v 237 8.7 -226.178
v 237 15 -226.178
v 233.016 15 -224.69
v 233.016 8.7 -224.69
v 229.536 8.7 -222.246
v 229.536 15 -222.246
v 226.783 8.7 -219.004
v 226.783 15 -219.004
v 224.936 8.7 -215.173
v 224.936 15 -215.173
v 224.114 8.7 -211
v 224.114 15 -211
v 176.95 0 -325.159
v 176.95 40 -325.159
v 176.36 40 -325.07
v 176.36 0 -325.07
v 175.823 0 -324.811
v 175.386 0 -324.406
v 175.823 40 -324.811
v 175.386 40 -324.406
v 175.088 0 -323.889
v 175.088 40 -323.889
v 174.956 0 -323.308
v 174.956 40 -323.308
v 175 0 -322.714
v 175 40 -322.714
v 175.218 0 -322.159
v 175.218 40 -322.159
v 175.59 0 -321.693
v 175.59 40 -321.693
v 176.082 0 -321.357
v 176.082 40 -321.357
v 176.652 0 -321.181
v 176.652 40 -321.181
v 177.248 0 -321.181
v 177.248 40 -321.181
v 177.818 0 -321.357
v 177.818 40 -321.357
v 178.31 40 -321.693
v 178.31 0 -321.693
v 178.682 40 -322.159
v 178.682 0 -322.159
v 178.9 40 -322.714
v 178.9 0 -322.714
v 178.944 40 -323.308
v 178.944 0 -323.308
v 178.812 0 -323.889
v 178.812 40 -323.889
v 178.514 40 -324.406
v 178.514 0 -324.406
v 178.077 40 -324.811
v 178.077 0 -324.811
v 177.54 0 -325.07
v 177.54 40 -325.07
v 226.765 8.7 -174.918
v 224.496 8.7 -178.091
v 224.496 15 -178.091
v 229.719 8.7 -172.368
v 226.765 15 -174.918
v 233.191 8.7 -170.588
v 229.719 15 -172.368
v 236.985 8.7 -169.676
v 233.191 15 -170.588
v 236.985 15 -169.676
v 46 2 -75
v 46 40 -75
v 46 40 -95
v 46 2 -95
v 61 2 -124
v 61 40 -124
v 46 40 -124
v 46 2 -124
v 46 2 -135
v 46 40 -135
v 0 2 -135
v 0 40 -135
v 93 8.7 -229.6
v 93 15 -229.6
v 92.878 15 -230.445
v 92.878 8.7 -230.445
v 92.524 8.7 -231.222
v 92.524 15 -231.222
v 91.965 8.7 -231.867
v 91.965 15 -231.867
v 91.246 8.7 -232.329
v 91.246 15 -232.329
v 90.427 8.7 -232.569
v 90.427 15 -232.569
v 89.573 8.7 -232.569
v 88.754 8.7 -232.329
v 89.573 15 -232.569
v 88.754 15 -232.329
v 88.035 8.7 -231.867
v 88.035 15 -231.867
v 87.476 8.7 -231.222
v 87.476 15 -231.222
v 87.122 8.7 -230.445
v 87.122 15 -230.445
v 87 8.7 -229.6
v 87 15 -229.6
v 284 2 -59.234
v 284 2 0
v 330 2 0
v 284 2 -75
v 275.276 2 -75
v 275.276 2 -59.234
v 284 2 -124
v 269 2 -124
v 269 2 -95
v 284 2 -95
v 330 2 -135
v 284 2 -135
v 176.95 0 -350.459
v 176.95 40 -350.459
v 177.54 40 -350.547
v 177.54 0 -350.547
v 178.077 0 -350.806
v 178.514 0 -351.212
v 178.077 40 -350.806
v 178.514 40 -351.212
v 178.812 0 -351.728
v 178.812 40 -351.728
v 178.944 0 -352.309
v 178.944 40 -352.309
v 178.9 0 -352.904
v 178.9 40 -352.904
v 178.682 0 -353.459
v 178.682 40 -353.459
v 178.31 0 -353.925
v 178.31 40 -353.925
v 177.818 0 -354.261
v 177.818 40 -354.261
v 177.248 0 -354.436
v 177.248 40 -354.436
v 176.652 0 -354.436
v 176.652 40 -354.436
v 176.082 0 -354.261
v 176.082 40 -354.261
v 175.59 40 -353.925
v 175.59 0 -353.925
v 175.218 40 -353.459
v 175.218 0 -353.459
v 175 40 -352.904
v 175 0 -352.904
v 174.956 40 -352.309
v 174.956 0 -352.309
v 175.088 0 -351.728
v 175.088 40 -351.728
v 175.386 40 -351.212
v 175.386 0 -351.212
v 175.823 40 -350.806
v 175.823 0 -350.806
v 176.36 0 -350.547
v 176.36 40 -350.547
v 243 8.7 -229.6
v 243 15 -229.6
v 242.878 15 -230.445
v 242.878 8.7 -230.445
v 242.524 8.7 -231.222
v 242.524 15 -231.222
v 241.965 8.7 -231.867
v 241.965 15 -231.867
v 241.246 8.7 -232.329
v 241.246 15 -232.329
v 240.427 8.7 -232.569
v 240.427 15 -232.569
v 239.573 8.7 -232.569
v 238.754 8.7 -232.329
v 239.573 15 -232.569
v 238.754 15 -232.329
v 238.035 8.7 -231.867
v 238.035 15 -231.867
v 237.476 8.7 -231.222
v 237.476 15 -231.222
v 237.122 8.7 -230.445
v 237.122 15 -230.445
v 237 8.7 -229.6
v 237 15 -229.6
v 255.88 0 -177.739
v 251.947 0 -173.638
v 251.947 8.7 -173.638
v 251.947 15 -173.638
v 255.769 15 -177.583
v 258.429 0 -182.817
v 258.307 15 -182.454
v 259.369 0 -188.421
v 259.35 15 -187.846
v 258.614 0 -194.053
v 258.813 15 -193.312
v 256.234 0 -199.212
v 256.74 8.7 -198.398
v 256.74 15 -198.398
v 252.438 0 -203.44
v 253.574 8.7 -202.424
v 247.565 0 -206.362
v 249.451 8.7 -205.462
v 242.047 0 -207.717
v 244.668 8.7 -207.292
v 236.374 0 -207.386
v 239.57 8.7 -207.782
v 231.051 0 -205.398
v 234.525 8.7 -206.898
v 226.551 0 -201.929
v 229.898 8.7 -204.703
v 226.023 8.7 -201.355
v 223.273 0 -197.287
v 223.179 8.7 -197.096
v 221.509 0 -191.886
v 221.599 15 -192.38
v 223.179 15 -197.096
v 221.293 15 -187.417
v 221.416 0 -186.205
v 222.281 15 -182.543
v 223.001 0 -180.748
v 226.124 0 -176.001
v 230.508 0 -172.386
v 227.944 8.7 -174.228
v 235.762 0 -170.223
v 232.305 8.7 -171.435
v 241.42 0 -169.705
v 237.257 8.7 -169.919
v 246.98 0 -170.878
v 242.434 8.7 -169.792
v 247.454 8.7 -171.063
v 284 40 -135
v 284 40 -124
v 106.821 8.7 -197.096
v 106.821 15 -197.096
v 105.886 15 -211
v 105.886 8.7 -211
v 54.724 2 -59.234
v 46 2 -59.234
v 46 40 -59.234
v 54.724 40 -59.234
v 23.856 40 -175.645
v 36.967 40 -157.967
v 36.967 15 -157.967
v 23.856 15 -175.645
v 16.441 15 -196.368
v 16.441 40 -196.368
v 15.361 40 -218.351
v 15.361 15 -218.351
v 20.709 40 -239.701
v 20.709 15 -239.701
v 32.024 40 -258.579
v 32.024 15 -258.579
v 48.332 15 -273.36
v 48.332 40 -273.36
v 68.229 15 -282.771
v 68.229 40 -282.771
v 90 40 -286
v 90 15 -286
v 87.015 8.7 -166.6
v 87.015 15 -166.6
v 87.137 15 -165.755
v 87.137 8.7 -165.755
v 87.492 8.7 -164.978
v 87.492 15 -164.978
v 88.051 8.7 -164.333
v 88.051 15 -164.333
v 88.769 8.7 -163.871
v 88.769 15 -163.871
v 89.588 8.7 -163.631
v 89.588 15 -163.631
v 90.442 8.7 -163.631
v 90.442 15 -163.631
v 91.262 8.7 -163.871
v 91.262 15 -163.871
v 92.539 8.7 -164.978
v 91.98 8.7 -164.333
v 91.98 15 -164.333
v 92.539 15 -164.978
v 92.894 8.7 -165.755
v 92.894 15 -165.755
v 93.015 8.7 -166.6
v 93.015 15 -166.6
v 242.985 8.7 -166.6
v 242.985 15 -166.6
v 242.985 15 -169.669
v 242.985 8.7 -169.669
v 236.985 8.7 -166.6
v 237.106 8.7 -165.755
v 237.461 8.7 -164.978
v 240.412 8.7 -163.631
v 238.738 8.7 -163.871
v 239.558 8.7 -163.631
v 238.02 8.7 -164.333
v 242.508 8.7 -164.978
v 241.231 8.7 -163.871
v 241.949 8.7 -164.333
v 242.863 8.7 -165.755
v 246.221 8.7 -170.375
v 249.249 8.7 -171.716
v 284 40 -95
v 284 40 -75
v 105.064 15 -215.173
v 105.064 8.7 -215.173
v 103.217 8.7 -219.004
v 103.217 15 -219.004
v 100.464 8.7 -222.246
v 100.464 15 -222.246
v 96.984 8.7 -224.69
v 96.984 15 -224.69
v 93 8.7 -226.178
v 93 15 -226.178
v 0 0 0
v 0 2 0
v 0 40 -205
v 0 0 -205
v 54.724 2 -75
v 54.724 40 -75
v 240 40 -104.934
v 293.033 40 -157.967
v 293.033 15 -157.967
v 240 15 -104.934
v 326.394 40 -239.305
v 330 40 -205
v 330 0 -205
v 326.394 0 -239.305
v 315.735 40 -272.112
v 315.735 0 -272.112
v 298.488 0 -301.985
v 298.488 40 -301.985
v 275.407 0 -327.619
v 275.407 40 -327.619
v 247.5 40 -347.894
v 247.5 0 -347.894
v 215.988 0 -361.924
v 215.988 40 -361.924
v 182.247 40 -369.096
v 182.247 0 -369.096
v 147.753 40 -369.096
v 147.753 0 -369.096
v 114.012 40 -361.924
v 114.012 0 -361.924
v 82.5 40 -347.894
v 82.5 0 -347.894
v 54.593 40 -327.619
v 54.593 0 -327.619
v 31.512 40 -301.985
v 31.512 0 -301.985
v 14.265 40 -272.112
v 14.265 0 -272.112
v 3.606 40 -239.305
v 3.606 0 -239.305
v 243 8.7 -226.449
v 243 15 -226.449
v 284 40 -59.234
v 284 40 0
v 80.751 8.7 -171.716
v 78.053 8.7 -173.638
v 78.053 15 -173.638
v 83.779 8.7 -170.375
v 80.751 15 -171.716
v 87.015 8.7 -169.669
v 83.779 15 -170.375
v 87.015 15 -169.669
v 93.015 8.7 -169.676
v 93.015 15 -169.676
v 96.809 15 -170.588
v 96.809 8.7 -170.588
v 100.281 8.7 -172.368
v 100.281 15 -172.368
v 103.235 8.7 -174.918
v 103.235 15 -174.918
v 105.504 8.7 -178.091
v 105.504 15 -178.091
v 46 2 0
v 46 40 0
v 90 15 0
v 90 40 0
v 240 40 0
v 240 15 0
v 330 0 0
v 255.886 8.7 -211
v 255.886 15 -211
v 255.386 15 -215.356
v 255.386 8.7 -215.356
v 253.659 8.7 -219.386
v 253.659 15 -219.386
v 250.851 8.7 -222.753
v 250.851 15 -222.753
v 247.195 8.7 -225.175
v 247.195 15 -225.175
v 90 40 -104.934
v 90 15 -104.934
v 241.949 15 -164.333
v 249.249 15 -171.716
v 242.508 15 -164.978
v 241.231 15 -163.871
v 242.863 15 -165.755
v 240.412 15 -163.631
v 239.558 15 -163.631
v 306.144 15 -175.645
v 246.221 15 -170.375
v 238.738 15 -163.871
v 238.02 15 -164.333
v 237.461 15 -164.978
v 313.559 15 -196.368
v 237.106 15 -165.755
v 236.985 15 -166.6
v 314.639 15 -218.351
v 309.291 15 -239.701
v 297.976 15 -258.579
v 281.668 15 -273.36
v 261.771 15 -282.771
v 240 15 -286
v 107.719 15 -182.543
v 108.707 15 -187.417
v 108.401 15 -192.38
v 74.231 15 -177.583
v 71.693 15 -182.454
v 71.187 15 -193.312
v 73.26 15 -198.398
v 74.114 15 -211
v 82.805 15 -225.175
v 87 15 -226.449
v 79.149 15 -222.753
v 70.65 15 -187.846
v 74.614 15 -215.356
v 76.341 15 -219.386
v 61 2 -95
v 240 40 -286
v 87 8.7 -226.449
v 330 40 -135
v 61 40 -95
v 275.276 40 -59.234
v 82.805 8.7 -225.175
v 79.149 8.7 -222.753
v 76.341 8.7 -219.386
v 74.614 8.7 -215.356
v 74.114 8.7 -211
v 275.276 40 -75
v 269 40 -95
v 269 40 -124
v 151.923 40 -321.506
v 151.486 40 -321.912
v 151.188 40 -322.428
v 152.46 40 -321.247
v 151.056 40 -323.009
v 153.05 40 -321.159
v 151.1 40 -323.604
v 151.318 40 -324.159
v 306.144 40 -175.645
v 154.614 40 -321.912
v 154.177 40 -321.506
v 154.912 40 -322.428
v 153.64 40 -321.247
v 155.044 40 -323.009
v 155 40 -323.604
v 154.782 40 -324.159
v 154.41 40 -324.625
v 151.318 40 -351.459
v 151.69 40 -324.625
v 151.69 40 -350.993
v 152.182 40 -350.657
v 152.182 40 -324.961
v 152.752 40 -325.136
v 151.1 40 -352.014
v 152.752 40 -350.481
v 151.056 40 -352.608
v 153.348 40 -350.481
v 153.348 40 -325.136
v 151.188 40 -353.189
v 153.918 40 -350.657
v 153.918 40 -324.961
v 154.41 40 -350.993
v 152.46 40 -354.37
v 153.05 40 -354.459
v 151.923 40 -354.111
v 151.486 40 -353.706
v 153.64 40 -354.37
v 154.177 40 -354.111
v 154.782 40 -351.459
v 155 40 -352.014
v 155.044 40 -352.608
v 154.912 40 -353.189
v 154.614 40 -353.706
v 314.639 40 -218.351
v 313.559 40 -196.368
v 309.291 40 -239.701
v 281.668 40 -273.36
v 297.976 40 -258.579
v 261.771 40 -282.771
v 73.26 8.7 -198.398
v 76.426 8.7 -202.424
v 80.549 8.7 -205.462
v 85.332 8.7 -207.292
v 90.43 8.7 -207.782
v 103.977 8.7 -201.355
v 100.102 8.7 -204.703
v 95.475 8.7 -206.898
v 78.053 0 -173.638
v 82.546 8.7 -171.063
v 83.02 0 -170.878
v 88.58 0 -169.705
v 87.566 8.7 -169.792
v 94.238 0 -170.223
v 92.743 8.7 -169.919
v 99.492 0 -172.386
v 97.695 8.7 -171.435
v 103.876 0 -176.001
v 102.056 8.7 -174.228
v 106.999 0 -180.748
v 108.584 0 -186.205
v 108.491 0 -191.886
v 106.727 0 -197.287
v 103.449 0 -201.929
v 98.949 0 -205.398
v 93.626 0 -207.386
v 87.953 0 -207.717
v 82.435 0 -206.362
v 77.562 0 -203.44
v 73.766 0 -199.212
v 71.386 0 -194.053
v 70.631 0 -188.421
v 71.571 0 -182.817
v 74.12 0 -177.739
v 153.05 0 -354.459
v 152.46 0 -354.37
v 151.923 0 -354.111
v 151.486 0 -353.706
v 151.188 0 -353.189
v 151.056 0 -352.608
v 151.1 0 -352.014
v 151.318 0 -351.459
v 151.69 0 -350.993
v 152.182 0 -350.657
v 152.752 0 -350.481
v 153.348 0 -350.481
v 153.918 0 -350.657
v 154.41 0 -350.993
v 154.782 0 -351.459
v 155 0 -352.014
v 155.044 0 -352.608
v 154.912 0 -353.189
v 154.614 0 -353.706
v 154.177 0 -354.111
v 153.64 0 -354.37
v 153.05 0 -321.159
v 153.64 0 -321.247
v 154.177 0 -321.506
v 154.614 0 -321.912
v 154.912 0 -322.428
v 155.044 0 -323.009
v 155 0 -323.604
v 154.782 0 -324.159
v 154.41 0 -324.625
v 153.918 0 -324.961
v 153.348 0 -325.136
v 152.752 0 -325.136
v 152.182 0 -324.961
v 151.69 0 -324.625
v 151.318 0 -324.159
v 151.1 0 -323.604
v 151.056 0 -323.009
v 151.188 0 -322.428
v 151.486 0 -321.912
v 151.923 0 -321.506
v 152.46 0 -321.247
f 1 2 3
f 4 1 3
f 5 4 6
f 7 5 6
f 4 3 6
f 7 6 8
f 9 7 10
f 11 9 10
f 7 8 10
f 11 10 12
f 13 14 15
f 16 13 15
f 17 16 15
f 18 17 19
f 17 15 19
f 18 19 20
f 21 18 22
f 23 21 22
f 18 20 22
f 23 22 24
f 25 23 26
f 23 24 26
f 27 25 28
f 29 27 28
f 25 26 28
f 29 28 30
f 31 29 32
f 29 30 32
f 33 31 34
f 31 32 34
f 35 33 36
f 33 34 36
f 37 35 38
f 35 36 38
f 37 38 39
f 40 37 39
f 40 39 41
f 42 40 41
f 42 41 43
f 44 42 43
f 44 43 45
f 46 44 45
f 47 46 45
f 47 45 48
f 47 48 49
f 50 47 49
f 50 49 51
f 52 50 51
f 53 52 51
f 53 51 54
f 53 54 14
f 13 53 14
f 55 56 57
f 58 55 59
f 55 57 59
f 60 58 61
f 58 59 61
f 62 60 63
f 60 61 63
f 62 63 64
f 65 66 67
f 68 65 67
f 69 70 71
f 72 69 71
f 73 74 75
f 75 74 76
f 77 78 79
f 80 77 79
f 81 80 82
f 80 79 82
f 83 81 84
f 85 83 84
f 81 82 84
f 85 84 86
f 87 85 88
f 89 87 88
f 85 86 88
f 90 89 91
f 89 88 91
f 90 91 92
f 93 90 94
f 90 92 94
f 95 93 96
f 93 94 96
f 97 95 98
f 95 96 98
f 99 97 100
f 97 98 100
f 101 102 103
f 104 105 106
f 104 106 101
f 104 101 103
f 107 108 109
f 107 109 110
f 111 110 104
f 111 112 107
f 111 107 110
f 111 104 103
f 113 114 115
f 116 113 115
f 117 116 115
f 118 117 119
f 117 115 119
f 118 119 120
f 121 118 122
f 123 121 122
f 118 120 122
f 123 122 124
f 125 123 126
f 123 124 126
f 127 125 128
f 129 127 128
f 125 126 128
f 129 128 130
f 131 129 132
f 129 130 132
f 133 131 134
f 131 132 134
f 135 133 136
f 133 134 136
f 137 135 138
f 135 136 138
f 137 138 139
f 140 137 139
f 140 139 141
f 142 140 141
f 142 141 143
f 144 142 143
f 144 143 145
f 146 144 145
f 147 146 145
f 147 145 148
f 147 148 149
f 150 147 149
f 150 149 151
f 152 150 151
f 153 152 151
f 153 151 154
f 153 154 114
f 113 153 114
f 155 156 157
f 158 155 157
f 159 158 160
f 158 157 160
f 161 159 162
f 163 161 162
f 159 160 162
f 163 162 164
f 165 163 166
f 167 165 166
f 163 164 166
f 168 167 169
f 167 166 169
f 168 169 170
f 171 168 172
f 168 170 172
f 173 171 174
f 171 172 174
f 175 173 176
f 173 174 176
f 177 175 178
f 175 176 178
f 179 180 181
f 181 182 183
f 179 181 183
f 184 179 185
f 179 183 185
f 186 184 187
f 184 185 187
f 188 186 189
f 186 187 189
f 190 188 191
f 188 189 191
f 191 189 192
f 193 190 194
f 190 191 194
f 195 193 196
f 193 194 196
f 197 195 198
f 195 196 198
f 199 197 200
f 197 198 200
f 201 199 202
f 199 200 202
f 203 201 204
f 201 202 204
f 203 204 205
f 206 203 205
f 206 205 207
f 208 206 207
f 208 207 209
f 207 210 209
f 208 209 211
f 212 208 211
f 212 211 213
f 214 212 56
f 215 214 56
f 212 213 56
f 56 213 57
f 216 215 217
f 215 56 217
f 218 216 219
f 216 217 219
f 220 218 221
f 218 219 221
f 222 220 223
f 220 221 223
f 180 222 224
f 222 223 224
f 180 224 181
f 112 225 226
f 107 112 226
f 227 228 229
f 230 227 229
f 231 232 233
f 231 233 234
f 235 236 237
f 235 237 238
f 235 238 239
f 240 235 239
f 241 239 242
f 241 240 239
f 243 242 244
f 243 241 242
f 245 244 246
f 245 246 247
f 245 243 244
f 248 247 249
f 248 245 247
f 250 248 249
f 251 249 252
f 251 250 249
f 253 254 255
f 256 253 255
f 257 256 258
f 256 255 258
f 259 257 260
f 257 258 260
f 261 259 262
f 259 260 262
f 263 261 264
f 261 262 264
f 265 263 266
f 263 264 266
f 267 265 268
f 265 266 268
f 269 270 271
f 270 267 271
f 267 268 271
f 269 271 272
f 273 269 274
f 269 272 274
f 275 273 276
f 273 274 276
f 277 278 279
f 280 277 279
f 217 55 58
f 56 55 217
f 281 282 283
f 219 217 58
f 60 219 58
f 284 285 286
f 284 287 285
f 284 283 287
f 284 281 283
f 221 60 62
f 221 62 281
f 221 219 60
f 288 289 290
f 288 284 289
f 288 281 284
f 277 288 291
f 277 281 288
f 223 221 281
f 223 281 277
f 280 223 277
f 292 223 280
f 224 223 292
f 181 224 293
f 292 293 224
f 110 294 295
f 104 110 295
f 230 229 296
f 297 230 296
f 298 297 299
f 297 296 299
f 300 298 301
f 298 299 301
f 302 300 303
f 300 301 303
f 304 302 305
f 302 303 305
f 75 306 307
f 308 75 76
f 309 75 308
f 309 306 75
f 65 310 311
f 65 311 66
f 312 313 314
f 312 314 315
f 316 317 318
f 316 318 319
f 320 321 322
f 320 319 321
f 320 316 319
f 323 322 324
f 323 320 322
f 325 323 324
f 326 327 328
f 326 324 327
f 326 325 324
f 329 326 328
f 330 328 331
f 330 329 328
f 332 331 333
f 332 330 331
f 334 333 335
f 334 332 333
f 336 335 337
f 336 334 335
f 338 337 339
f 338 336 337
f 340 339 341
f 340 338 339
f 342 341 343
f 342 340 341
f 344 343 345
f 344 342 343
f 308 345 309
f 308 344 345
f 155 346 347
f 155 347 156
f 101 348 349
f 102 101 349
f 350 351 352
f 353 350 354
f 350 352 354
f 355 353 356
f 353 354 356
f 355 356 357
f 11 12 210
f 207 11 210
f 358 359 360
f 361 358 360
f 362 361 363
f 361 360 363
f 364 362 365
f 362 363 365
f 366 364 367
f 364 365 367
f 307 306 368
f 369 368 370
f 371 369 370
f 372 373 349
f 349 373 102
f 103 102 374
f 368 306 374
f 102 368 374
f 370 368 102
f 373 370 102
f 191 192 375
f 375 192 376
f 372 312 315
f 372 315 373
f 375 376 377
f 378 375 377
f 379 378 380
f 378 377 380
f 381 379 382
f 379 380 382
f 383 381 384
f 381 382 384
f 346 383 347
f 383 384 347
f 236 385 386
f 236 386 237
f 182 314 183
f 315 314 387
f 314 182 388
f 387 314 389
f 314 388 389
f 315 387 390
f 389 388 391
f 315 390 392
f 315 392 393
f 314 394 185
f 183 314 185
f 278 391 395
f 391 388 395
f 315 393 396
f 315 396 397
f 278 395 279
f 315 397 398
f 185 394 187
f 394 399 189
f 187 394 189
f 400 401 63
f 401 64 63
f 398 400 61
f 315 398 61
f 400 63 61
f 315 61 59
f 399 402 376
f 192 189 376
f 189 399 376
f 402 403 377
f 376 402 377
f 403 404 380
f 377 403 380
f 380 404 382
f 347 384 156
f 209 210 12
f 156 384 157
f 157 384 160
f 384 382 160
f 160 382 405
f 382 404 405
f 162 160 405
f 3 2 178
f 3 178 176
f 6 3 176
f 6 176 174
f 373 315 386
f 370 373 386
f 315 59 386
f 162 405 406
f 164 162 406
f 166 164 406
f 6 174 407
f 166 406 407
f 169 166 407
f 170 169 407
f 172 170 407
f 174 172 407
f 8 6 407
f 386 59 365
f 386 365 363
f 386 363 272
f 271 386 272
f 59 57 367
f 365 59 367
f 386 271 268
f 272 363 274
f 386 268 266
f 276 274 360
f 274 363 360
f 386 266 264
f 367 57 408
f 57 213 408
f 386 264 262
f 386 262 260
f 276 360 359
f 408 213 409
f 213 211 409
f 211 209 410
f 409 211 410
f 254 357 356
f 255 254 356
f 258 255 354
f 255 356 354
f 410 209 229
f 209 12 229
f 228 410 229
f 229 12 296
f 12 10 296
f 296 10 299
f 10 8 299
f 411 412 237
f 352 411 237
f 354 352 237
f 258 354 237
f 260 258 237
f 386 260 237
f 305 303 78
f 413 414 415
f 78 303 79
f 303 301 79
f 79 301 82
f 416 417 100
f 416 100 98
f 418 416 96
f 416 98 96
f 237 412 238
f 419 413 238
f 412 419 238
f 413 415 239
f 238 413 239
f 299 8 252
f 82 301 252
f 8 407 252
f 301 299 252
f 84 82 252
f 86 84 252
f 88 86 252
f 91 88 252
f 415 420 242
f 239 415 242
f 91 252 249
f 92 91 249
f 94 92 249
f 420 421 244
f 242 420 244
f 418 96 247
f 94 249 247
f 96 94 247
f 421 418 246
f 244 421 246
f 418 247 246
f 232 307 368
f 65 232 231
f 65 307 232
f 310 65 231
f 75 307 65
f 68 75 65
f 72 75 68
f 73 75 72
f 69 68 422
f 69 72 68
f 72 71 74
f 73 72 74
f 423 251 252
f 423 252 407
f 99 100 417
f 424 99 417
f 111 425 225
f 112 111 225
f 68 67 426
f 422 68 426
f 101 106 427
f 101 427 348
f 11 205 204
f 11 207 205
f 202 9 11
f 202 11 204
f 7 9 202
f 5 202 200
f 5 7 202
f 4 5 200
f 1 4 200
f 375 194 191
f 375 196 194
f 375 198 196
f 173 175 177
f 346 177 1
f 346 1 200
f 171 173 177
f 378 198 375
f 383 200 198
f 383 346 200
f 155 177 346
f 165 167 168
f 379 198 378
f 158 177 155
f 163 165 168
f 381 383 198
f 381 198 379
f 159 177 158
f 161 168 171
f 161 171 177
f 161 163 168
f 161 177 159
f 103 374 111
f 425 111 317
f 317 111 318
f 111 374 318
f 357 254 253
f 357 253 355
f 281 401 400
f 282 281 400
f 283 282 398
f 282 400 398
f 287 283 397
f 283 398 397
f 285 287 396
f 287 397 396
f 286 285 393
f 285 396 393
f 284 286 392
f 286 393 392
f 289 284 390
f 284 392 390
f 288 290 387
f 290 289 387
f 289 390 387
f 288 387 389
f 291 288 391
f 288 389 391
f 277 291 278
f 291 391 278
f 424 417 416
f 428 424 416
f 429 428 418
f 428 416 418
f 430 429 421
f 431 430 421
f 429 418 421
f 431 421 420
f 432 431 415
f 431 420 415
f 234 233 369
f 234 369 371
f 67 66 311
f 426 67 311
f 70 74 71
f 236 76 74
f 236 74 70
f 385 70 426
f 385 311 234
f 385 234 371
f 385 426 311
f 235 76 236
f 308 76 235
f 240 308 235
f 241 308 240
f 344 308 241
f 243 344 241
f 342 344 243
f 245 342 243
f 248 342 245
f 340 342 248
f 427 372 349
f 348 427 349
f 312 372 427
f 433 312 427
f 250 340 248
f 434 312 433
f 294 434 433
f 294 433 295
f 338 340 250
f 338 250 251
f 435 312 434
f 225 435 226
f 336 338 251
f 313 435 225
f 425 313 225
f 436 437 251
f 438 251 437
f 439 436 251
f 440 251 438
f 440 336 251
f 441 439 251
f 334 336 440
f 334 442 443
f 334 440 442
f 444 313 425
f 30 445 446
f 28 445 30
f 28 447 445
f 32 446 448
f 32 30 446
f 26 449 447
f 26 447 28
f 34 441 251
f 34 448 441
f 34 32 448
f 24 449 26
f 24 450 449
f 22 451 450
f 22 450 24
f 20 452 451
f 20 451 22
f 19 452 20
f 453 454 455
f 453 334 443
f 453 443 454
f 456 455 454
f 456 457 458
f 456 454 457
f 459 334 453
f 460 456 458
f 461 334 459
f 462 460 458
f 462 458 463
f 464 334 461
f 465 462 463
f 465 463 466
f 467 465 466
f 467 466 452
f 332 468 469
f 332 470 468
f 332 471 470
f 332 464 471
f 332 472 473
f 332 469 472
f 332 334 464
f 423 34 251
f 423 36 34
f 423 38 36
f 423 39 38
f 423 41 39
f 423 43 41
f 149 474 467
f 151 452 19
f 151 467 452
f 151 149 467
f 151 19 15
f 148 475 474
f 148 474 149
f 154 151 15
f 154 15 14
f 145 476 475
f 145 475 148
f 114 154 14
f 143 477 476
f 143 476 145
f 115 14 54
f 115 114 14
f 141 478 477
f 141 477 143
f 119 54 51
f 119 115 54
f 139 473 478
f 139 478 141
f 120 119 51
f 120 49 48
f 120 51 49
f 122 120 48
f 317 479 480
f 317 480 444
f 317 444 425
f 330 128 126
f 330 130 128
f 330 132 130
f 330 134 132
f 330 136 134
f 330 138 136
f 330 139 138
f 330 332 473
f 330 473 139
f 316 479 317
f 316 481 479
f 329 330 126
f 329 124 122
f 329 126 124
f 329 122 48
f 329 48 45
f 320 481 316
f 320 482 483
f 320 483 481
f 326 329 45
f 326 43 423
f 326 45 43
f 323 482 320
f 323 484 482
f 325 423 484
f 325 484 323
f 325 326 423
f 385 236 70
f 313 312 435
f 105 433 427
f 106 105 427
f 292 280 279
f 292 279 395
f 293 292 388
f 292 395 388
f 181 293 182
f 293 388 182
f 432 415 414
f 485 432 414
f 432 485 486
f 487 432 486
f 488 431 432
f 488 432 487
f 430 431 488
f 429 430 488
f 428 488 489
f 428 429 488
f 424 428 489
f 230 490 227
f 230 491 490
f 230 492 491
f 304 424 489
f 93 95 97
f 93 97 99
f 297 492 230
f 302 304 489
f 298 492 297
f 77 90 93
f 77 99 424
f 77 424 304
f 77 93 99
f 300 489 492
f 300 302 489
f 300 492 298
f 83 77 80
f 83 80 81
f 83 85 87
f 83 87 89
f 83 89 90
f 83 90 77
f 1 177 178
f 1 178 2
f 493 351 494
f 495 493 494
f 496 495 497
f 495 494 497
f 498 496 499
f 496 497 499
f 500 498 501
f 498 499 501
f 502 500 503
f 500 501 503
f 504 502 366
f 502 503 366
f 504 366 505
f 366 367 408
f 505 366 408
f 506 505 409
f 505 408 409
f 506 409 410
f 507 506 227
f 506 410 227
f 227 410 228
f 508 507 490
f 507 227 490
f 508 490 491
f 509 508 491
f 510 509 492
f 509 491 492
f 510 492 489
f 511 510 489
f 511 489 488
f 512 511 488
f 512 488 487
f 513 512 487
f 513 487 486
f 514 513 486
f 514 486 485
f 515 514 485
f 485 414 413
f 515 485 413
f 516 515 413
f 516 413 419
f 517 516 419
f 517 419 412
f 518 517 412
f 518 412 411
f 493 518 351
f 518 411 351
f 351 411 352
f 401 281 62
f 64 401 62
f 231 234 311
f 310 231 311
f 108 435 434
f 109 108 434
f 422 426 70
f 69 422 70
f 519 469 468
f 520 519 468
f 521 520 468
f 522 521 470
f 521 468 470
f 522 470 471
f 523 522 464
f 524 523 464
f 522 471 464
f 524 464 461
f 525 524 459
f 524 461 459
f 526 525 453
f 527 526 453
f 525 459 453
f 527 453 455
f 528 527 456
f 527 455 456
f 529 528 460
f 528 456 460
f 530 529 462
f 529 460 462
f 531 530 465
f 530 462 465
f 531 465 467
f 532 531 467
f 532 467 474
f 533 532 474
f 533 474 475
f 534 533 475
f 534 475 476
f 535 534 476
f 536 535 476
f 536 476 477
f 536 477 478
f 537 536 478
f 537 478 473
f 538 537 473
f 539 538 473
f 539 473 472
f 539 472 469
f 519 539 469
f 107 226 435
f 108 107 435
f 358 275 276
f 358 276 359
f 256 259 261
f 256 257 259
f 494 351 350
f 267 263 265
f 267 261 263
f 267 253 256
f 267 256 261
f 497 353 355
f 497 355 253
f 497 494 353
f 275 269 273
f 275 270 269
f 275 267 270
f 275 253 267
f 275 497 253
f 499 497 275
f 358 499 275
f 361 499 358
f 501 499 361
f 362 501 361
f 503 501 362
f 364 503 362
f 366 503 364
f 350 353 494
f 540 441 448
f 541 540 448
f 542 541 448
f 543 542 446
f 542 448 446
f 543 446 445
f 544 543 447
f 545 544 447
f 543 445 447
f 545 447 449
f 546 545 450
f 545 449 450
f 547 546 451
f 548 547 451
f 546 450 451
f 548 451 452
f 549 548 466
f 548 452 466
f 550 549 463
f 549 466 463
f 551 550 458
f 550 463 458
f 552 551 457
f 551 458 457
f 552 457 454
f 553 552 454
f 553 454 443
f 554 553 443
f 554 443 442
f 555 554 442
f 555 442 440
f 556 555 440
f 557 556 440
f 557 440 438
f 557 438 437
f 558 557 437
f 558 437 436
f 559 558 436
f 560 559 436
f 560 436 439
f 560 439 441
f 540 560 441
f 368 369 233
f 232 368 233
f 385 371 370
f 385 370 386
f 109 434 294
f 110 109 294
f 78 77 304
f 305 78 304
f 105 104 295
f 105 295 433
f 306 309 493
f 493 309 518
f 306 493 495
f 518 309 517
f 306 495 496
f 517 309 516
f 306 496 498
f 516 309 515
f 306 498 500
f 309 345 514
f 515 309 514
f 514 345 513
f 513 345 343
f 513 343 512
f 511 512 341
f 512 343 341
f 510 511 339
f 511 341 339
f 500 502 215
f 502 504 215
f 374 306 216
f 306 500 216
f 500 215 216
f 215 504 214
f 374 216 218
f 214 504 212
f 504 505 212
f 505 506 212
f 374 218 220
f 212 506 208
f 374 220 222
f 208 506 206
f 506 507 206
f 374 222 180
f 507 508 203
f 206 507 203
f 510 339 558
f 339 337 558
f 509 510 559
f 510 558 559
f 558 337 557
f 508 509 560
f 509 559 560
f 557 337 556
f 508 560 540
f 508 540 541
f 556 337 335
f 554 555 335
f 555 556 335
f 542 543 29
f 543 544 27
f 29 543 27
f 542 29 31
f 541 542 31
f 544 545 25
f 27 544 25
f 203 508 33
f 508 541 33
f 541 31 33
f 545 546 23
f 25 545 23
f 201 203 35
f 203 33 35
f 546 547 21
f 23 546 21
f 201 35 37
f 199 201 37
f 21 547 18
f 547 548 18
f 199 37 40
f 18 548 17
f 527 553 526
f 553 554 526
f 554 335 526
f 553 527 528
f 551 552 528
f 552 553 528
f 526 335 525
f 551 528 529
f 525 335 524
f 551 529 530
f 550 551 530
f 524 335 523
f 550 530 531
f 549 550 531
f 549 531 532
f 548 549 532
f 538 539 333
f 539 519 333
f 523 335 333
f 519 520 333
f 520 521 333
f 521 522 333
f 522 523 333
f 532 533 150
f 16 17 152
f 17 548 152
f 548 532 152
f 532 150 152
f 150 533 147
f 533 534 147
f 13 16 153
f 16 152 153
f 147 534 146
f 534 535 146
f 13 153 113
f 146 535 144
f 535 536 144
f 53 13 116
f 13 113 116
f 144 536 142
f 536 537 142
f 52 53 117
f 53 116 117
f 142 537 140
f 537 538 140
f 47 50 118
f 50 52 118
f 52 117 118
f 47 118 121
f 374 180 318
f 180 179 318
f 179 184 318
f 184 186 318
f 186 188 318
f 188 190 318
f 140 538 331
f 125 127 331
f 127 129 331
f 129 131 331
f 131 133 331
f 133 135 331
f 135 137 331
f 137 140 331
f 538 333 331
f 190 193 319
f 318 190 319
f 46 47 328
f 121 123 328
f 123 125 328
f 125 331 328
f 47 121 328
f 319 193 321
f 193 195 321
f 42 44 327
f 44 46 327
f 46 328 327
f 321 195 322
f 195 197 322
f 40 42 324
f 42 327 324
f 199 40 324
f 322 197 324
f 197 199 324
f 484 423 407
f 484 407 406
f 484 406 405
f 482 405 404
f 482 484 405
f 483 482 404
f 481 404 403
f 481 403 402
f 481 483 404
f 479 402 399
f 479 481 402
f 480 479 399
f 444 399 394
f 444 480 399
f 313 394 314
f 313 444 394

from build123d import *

# Parameters (mm, degrees)
ESQUISSE1_W              = 330
ESQUISSE1_H              = 370
CORP_DEPTH               = 40
CONG_AVANT_RADIUS        = 165
CONG_AVANT_LENGTH        = 40
TROU_POUR_ROUE_DEPTH     = 38
ESQUISSE4_R              = 2
TROU_POUR_ROULETTE_DEPTH = 50
TROU_POUR_BALAYEUR_DEPTH = 25
MOTEUR_PALE_DEPTH        = 6.3
ESQUISSE7_R              = 3
ENL_V_MAT_EXTRU_10_DEPTH = 6.3
ESQUISSE8_W              = 6
ESQUISSE8_H              = 3.075554286
ENL_V_MAT_EXTRU_11_DEPTH = 6.3
ESQUISSE9_R              = 19.061984771
ENL_V_MAT_EXTRU_12_DEPTH = 33


with BuildPart() as part:
    # Esquisse1 → corp (new body)
    with BuildSketch(Plane(origin=(0, 0, 0), x_dir=(1, 0, 0), z_dir=(0, 1, 0))):
        with Locations((165, 185)):
            Rectangle(ESQUISSE1_W, ESQUISSE1_H)
    extrude(amount=CORP_DEPTH)

    # congé avant: full round fillet: the end face becomes a half cylinder, R = half its width
    cong_avant_face = Plane((165, 20, -370), x_dir=(0, 1, 0), z_dir=(0, 0, -1))  # on the end face: x along it, z out of the body
    cong_avant_slab = cong_avant_face.offset(-CONG_AVANT_RADIUS / 2) * Box(CONG_AVANT_LENGTH, 2 * CONG_AVANT_RADIUS, CONG_AVANT_RADIUS, mode=Mode.PRIVATE)  # the body's end, R deep
    cong_avant_round = Plane((165, 20, -205), x_dir=(0, 0, -1), z_dir=(0, 1, 0)) * Cylinder(CONG_AVANT_RADIUS, CONG_AVANT_LENGTH, mode=Mode.PRIVATE)  # its axis R under the face
    add(cong_avant_slab - cong_avant_round, mode=Mode.SUBTRACT)

    # Esquisse3 → trou pour roue (cut)
    with BuildSketch(Plane(origin=(0, 40, 0), x_dir=(1, 0, 0), z_dir=(0, 1, 0))):
        Polygon((46, 124), (46, 135), (0, 135), (0, 0), (46, 0), (46, 59.234399469), (54.724206143, 59.234399469), (54.724206143, 75), (46, 75), (46, 95), (61, 95), (61, 124), align=None)
        Polygon((284, 95), (284, 75), (275.275793857, 75), (275.275793857, 59.234399469), (284, 59.234399469), (284, 0), (330, 0), (330, 135), (284, 135), (284, 124), (269, 124), (269, 95), align=None)
    extrude(amount=-TROU_POUR_ROUE_DEPTH, mode=Mode.SUBTRACT)

    # Esquisse4 → trou pour roulette (cut)
    with BuildSketch(Plane(origin=(0, 40, 0), x_dir=(1, 0, 0), z_dir=(0, 1, 0))):
        with Locations(Location((176.95, 352.458632269, 0), (0, 0, 270))):
            Circle(ESQUISSE4_R)
        with Locations(Location((176.95, 323.158632269, 0), (0, 0, 90))):
            Circle(ESQUISSE4_R)
        with Locations(Location((153.05, 323.158632269, 0), (0, 0, 270))):
            Circle(ESQUISSE4_R)
        with Locations(Location((153.05, 352.458632269, 0), (0, 0, 90))):
            Circle(ESQUISSE4_R)
    extrude(amount=-TROU_POUR_ROULETTE_DEPTH, mode=Mode.SUBTRACT)

    # Esquisse5 → Trou pour balayeur (cut)
    with BuildSketch(Plane(origin=(0, 40, 0), x_dir=(1, 0, 0), z_dir=(0, 1, 0))):
        with BuildLine():
            Line((90, 286), (240, 286))
            ThreePointArc((240, 286), (309.290964938, 239.701257427), (293.033008589, 157.966991411))
            Line((293.033008589, 157.966991411), (240, 104.933982822))
            Line((240, 104.933982822), (240, 0))
            Line((240, 0), (90, 0))
            Line((90, 0), (90, 104.933982822))
            Line((90, 104.933982822), (36.966991411, 157.966991411))
            ThreePointArc((36.966991411, 157.966991411), (20.709035062, 239.701257427), (90, 286))
        make_face()
    extrude(amount=-TROU_POUR_BALAYEUR_DEPTH, mode=Mode.SUBTRACT)

    # Esquisse6 → moteur pale (cut)
    with BuildSketch(Plane(origin=(0, 15, 0), x_dir=(1, 0, 0), z_dir=(0, 1, 0))):
        with BuildLine():
            Line((257.506073255, 187.1), (255.885842754, 211))
            ThreePointArc((255.885842754, 211), (251.445088501, 222.191160152), (240.245274455, 226.610043405))
            ThreePointArc((240.245274455, 226.610043405), (240.122739998, 226.602511903), (240, 226.6))
            ThreePointArc((240, 226.6), (229.088615697, 221.822854824), (224.114157246, 211))
            Line((224.114157246, 211), (222.506073255, 187.1))
            ThreePointArc((222.506073255, 187.1), (227.152012558, 174.508282489), (239.63580106, 169.57967959))
            ThreePointArc((239.63580106, 169.57967959), (239.977179555, 169.600029468), (240.318655983, 169.581395004))
            ThreePointArc((240.318655983, 169.581395004), (252.842661862, 174.484702191), (257.506073255, 187.1))
        make_face()
        with BuildLine():
            ThreePointArc((89.754725545, 226.610043405), (78.554911499, 222.191160152), (74.114157246, 211))
            Line((74.114157246, 211), (72.493926745, 187.1))
            ThreePointArc((72.493926745, 187.1), (77.157338138, 174.484702191), (89.681344017, 169.581395004))
            ThreePointArc((89.681344017, 169.581395004), (90.022820445, 169.600029468), (90.36419894, 169.57967959))
            ThreePointArc((90.36419894, 169.57967959), (102.847987442, 174.508282489), (107.493926745, 187.1))
            Line((107.493926745, 187.1), (105.885842754, 211))
            ThreePointArc((105.885842754, 211), (100.911384303, 221.822854824), (90, 226.6))
            ThreePointArc((90, 226.6), (89.877260002, 226.602511903), (89.754725545, 226.610043405))
        make_face()
    extrude(amount=-MOTEUR_PALE_DEPTH, mode=Mode.SUBTRACT)

    # Esquisse7 → Enlèv. mat.-Extru.10 (cut)
    with BuildSketch(Plane(origin=(0, 15, 0), x_dir=(1, 0, 0), z_dir=(0, 1, 0))):
        with Locations((240, 229.6)):
            Circle(ESQUISSE7_R)
        with Locations((90, 229.6)):
            Circle(ESQUISSE7_R)
        with Locations((90.015284108, 166.600038934)):
            Circle(ESQUISSE7_R)
        with Locations((239.984715892, 166.600038934)):
            Circle(ESQUISSE7_R)
    extrude(amount=-ENL_V_MAT_EXTRU_10_DEPTH, mode=Mode.SUBTRACT)

    # Esquisse8 → Enlèv. mat.-Extru.11 (cut)
    with BuildSketch(Plane(origin=(0, 15, 0), x_dir=(1, 0, 0), z_dir=(0, 1, 0))):
        Polygon((93, 229.6), (93, 226.178416603), (87, 226.178416603), (87, 226.449068216), (87, 229.6), align=None)
        Polygon((237, 226.178416603), (243, 226.178416603), (243, 226.449068216), (243, 229.6), (237, 229.6), align=None)
        with Locations((90.015284108, 168.137816077)):
            Rectangle(ESQUISSE8_W, ESQUISSE8_H)
        with Locations((239.984715892, 168.137816077)):
            Rectangle(ESQUISSE8_W, ESQUISSE8_H)
    extrude(amount=-ENL_V_MAT_EXTRU_11_DEPTH, mode=Mode.SUBTRACT)

    # Esquisse9 → Enlèv. mat.-Extru.12 (cut)
    with BuildSketch(Plane(origin=(0, 15, 0), x_dir=(1, 0, 0), z_dir=(0, 1, 0))):
        with Locations(Location((240.309161112, 188.734839537, 0), (0, 0, 307.62761802))):
            Circle(ESQUISSE9_R)
        with Locations(Location((89.690838888, 188.734839537, 0), (0, 0, 232.37238198))):
            Circle(ESQUISSE9_R)
    extrude(amount=-ENL_V_MAT_EXTRU_12_DEPTH, mode=Mode.SUBTRACT)


solid = part.part
